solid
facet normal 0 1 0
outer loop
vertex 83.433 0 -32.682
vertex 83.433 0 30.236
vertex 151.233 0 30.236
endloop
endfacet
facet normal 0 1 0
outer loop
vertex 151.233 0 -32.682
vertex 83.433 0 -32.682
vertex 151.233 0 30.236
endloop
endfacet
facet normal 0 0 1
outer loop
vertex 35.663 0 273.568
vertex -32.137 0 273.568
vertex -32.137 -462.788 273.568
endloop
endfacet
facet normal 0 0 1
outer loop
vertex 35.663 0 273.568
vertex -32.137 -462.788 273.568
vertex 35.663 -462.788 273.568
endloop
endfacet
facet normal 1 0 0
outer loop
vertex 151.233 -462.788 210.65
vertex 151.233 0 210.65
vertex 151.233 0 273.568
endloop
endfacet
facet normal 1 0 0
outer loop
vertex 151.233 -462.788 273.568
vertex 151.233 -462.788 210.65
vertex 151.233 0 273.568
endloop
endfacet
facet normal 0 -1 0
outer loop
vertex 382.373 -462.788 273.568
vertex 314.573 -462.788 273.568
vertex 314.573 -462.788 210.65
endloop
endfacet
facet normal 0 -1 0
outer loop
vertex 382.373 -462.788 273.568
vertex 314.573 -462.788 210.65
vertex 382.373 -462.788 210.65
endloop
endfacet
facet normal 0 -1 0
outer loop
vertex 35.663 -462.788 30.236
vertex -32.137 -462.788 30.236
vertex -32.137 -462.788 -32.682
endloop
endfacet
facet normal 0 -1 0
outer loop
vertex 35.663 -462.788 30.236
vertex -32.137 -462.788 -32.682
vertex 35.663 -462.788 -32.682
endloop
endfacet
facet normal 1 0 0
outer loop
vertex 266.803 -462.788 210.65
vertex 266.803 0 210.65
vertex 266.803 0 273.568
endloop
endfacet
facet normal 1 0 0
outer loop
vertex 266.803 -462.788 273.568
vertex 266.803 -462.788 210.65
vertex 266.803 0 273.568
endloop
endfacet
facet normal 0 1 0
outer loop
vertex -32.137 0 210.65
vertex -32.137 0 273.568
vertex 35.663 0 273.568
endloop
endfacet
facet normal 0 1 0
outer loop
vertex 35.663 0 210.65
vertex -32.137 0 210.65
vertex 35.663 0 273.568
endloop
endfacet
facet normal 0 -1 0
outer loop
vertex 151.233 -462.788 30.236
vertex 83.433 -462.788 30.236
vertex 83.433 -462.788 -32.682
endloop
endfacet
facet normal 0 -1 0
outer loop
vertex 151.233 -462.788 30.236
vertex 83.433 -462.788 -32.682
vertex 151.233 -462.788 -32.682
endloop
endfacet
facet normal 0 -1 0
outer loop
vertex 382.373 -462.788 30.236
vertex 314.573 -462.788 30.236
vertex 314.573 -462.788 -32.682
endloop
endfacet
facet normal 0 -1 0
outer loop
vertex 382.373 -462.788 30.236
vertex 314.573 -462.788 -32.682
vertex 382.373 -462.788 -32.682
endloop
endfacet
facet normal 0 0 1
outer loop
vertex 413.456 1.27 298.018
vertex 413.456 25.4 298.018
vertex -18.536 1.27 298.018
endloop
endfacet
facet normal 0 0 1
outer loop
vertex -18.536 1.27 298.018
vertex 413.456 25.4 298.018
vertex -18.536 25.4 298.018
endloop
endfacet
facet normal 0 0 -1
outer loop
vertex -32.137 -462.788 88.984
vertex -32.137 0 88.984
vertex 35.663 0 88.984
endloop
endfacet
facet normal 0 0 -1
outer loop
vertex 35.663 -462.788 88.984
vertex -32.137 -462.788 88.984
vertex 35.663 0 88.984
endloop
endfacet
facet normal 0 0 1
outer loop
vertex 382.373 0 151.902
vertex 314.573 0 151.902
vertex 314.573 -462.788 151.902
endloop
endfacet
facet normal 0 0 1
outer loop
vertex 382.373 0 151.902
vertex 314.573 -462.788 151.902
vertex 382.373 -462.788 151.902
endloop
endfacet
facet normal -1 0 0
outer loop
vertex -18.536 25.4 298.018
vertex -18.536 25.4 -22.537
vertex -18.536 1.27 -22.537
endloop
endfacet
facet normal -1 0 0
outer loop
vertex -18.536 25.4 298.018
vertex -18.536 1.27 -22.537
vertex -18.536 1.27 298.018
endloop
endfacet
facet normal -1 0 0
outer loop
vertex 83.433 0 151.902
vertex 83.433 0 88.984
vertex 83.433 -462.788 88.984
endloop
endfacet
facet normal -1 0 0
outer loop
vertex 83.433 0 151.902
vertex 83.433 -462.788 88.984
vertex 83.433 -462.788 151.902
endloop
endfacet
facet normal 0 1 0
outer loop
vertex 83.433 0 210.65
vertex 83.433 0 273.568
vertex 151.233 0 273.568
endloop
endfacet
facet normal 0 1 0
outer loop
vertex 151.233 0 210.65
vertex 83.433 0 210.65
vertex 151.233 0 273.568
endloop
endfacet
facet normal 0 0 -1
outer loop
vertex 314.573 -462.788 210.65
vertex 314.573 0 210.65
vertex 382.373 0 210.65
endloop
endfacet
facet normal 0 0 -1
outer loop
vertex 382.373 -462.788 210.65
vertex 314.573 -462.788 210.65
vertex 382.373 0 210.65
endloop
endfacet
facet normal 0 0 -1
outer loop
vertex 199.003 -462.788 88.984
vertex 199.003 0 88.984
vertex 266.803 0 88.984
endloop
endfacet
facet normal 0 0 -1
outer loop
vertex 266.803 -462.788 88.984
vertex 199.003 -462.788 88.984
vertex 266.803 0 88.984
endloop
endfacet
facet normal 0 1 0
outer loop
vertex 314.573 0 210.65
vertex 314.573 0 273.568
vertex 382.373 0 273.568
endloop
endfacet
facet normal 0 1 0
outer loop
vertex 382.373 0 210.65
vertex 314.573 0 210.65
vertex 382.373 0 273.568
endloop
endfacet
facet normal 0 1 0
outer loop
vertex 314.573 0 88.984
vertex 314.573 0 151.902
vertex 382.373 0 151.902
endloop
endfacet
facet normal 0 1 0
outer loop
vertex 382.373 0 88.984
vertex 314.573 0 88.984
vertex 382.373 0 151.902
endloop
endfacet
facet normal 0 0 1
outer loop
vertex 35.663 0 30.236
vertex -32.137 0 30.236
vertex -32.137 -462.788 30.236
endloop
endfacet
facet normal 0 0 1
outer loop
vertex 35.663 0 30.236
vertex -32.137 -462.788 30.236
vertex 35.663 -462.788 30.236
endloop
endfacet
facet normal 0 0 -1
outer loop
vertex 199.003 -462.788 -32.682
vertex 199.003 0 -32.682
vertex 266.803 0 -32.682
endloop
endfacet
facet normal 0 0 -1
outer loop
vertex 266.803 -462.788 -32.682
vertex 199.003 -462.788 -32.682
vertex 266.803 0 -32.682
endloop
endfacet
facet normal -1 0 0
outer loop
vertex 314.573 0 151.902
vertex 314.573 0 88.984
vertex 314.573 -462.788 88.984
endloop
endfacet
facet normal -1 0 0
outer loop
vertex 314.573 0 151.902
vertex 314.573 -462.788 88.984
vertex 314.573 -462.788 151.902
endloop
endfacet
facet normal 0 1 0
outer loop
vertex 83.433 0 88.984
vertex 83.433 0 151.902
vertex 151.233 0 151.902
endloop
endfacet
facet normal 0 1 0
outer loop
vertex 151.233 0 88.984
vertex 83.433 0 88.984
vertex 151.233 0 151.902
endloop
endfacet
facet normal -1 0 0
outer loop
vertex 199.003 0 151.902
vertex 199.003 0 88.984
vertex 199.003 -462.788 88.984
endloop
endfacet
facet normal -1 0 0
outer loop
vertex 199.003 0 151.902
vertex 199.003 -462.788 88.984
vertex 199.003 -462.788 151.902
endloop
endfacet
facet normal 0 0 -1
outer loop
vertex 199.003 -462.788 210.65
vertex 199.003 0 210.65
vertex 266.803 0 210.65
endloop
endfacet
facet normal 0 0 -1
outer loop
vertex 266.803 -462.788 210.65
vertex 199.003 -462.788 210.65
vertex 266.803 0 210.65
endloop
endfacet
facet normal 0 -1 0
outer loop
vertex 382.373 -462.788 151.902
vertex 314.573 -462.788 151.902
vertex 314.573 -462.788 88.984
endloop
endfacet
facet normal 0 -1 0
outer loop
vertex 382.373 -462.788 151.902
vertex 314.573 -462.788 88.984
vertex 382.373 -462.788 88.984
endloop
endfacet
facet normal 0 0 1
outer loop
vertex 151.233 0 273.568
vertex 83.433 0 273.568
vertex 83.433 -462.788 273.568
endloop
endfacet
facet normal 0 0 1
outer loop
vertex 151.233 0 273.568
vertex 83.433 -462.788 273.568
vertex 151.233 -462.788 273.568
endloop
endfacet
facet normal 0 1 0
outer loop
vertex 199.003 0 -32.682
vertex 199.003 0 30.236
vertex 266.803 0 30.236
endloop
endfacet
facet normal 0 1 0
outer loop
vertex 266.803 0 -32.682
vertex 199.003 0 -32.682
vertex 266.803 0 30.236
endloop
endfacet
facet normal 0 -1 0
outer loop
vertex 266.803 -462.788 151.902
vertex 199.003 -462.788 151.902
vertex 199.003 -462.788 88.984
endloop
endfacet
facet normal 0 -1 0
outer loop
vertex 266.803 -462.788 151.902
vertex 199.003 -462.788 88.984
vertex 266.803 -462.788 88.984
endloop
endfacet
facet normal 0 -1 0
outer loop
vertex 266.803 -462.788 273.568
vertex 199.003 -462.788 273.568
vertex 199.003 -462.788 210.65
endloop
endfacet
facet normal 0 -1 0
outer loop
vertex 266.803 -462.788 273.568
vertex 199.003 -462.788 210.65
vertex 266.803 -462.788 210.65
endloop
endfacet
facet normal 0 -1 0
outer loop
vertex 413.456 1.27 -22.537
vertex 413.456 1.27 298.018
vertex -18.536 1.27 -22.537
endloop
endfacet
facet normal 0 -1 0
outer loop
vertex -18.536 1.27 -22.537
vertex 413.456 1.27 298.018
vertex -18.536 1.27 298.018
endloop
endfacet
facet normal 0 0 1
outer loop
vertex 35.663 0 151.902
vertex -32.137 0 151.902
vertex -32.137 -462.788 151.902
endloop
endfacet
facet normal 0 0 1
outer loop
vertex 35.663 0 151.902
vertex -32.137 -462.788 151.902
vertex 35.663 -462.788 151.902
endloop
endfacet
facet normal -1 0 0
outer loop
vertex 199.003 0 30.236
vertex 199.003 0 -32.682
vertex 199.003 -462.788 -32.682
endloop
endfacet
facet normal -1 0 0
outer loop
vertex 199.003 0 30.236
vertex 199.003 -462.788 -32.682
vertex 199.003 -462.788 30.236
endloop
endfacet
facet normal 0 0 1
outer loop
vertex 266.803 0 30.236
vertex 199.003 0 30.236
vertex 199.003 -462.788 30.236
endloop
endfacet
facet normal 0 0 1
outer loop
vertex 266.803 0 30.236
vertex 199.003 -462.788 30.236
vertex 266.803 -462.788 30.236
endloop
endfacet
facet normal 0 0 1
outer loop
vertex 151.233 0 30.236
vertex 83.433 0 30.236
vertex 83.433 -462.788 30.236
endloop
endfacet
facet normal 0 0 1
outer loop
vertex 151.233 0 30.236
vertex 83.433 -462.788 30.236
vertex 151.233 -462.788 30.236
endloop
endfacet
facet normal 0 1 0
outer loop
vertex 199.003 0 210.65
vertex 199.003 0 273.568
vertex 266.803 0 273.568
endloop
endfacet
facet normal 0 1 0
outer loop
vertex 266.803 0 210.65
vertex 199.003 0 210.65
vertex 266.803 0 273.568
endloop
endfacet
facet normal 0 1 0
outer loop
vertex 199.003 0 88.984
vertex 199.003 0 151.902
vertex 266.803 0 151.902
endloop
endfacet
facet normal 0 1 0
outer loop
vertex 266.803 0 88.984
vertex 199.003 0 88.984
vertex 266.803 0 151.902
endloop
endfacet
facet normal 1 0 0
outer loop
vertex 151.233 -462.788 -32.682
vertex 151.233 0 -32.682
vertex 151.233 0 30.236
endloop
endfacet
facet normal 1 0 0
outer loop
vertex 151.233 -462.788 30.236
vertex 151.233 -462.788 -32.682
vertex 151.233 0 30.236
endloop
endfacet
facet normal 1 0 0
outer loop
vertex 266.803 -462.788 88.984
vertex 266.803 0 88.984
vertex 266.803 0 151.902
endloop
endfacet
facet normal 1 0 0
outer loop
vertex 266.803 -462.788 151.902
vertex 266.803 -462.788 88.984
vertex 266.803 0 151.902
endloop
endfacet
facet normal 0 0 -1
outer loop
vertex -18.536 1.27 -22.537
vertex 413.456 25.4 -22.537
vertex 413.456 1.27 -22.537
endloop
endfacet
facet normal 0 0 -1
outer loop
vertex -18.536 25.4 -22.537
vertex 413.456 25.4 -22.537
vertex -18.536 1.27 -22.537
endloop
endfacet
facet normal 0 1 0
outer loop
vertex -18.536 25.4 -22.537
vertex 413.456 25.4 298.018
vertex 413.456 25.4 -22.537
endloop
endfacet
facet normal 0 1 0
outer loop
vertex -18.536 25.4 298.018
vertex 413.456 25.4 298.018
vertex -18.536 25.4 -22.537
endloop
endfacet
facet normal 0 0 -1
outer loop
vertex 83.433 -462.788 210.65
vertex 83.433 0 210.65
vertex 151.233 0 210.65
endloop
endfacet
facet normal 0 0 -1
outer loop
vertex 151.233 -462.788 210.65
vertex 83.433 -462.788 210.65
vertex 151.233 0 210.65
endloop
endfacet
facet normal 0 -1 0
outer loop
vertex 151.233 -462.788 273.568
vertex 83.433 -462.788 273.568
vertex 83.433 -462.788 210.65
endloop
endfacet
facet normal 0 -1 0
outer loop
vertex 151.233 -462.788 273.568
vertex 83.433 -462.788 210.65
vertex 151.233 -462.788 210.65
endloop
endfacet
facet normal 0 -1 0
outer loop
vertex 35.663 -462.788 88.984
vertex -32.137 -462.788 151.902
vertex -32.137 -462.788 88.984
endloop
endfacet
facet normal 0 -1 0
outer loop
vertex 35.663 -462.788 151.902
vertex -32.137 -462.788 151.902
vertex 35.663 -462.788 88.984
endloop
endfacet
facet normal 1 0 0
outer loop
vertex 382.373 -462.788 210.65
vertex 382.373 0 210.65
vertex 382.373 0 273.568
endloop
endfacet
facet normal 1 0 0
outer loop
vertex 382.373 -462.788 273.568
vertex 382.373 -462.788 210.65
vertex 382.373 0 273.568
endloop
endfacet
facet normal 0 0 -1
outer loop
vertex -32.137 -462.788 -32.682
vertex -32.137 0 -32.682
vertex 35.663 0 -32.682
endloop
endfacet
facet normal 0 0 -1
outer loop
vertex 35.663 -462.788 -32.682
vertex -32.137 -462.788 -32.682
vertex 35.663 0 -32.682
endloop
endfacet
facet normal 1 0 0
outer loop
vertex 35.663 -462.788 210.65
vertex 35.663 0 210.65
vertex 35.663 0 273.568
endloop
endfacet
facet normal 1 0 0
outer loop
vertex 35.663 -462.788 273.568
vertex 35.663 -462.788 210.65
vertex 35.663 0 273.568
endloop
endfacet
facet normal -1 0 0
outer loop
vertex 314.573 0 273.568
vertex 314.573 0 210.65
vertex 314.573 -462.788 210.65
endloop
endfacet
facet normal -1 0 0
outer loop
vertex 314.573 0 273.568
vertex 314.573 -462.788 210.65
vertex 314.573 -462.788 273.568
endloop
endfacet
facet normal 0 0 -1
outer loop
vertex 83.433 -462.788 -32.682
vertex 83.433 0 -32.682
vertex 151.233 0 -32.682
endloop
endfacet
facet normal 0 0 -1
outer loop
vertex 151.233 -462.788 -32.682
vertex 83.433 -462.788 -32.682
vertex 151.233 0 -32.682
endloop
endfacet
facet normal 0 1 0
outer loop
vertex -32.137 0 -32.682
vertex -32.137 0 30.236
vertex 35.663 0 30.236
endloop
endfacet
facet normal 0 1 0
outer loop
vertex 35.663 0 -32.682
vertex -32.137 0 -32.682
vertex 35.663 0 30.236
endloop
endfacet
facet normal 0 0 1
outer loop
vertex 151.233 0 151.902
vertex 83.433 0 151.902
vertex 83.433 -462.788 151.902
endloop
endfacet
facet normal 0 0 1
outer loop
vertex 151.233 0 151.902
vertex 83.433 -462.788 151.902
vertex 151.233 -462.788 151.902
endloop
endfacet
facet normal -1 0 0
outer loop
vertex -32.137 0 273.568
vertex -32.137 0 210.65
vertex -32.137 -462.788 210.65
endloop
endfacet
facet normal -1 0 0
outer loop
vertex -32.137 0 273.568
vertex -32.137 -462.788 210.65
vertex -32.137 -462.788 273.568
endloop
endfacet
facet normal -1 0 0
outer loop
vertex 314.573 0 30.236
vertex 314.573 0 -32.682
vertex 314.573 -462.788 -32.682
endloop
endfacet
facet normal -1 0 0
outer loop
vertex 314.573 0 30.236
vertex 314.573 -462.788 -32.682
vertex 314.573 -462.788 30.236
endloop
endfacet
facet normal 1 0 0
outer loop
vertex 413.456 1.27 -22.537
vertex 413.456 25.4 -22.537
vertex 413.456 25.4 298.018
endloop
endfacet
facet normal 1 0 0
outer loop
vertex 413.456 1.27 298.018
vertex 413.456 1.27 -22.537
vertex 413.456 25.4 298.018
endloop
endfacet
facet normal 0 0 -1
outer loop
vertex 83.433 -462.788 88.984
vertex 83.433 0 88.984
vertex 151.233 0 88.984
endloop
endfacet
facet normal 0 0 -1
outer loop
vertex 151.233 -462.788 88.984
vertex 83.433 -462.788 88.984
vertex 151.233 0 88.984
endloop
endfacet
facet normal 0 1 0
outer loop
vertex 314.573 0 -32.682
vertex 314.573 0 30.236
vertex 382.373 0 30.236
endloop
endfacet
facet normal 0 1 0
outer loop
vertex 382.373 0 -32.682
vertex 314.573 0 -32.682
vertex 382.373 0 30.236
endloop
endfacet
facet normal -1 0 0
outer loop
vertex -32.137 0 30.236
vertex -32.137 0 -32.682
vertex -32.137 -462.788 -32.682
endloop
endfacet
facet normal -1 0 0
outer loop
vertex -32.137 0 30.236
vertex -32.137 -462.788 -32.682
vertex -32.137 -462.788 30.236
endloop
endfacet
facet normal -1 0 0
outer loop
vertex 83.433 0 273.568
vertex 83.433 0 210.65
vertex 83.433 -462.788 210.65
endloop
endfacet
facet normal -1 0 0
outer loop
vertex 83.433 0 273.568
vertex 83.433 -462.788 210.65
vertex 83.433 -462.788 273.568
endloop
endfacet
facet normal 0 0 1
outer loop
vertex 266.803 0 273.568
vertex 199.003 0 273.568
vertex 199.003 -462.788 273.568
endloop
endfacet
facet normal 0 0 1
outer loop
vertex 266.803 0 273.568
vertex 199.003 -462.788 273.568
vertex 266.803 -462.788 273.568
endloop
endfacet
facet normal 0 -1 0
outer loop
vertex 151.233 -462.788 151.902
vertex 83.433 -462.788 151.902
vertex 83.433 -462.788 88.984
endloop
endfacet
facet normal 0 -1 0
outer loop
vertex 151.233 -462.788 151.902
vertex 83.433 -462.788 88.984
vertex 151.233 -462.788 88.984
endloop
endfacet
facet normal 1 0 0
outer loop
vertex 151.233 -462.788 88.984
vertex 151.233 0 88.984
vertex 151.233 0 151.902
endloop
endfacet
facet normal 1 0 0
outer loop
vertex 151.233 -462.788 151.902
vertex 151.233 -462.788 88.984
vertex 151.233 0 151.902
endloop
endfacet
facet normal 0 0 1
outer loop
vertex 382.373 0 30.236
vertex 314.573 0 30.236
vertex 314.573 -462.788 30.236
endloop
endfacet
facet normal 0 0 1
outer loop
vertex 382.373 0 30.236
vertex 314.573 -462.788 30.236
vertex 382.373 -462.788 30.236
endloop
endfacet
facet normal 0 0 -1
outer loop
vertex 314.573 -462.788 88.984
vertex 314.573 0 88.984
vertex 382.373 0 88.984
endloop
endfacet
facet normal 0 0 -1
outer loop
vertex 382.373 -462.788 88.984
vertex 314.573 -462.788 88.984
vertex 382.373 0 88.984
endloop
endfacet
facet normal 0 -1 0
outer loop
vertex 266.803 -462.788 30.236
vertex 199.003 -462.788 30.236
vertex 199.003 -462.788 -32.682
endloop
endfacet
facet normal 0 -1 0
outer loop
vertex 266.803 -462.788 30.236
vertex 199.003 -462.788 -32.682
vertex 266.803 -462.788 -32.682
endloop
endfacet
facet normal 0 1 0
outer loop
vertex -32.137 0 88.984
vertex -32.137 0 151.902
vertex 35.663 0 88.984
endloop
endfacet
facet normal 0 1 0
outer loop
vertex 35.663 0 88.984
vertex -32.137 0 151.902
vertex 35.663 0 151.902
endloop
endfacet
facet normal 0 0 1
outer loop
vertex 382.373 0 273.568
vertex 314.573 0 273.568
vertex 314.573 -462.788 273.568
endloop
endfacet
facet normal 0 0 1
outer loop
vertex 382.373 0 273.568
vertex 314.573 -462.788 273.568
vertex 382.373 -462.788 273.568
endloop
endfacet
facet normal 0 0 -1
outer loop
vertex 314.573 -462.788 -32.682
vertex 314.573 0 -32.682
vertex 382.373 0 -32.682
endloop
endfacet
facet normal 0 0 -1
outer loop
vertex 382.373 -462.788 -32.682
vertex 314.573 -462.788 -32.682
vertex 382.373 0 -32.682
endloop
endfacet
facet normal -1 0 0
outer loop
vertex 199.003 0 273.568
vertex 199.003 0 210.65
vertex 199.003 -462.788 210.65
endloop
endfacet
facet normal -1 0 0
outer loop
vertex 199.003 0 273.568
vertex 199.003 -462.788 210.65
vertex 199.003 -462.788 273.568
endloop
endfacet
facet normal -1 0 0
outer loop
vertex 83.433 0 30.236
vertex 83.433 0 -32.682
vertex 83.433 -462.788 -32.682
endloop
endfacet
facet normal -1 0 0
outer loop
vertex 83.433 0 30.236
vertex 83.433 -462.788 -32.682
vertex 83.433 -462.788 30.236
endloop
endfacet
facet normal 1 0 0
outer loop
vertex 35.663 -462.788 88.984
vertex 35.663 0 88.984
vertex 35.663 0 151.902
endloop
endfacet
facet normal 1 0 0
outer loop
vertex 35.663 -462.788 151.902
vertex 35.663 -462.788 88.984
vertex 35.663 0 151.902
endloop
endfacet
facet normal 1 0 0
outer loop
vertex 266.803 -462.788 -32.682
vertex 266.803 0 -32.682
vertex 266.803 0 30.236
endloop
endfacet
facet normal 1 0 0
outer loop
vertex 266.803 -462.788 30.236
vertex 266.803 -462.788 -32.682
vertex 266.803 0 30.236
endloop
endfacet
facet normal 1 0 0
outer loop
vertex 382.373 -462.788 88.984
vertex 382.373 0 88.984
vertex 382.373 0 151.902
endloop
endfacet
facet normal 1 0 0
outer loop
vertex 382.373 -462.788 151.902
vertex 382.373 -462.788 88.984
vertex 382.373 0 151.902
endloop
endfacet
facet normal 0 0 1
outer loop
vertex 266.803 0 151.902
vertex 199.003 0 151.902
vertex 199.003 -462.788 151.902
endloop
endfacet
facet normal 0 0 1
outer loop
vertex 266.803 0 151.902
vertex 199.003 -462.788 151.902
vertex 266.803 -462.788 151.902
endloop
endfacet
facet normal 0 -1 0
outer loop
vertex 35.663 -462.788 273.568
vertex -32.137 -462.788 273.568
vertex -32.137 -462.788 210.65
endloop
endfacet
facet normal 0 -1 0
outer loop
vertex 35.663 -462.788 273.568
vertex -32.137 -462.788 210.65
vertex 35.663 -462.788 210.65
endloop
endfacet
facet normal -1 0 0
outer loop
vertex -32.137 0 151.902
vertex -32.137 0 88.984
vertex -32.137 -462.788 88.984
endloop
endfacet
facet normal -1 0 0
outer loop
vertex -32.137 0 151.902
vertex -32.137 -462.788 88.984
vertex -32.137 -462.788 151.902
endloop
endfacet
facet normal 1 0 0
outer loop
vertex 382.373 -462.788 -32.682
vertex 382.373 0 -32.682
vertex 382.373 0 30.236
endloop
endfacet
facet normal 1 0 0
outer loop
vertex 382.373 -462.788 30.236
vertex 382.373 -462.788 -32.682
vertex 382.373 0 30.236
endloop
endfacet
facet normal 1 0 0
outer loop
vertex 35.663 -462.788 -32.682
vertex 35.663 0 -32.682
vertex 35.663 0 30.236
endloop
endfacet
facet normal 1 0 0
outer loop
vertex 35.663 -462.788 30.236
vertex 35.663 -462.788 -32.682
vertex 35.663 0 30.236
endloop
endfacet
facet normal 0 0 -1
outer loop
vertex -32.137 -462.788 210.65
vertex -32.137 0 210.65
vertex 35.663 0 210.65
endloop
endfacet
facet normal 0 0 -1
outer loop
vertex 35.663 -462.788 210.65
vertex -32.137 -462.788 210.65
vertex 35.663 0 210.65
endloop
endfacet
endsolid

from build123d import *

# Parameters (mm, degrees)
F0_W     = 67.8000804037
F0_H     = 62.9184693098
F1_DEPTH = 462.788
F3_W     = 431.9924879819
F3_H     = 320.5544073135
F4_DEPTH = 24.13


with BuildPart() as f1:
    # F0 (on Front) → F1 (new body)
    with BuildSketch(Plane.XZ):
        with Locations((1.76280085, -1.2232288718)):
            Rectangle(F0_W, F0_H)
    extrude(amount=F1_DEPTH)


with BuildPart() as f1b:
    # F0 (on Front) → F1, piece 2 (new body)
    with BuildSketch(Plane.XZ):
        with Locations((1.76280085, 120.4427711282)):
            Rectangle(F0_W, F0_H)
    extrude(amount=F1_DEPTH)


with BuildPart() as f1c:
    # F0 (on Front) → F1, piece 3 (new body)
    with BuildSketch(Plane.XZ):
        with Locations((1.76280085, 242.1087711282)):
            Rectangle(F0_W, F0_H)
    extrude(amount=F1_DEPTH)


with BuildPart() as f1d:
    # F0 (on Front) → F1, piece 4 (new body)
    with BuildSketch(Plane.XZ):
        with Locations((117.33280085, -1.2232288718)):
            Rectangle(F0_W, F0_H)
    extrude(amount=F1_DEPTH)


with BuildPart() as f1e:
    # F0 (on Front) → F1, piece 5 (new body)
    with BuildSketch(Plane.XZ):
        with Locations((117.33280085, 120.4427711282)):
            Rectangle(F0_W, F0_H)
    extrude(amount=F1_DEPTH)


with BuildPart() as f1f:
    # F0 (on Front) → F1, piece 6 (new body)
    with BuildSketch(Plane.XZ):
        with Locations((117.33280085, 242.1087711282)):
            Rectangle(F0_W, F0_H)
    extrude(amount=F1_DEPTH)


with BuildPart() as f1g:
    # F0 (on Front) → F1, piece 7 (new body)
    with BuildSketch(Plane.XZ):
        with Locations((232.90280085, -1.2232288718)):
            Rectangle(F0_W, F0_H)
    extrude(amount=F1_DEPTH)


with BuildPart() as f1h:
    # F0 (on Front) → F1, piece 8 (new body)
    with BuildSketch(Plane.XZ):
        with Locations((232.90280085, 120.4427711282)):
            Rectangle(F0_W, F0_H)
    extrude(amount=F1_DEPTH)


with BuildPart() as f1i:
    # F0 (on Front) → F1, piece 9 (new body)
    with BuildSketch(Plane.XZ):
        with Locations((232.90280085, 242.1087711282)):
            Rectangle(F0_W, F0_H)
    extrude(amount=F1_DEPTH)


with BuildPart() as f1j:
    # F0 (on Front) → F1, piece 10 (new body)
    with BuildSketch(Plane.XZ):
        with Locations((348.47280085, -1.2232288718)):
            Rectangle(F0_W, F0_H)
    extrude(amount=F1_DEPTH)


with BuildPart() as f1k:
    # F0 (on Front) → F1, piece 11 (new body)
    with BuildSketch(Plane.XZ):
        with Locations((348.47280085, 120.4427711282)):
            Rectangle(F0_W, F0_H)
    extrude(amount=F1_DEPTH)


with BuildPart() as f1l:
    # F0 (on Front) → F1, piece 12 (new body)
    with BuildSketch(Plane.XZ):
        with Locations((348.47280085, 242.1087711282)):
            Rectangle(F0_W, F0_H)
    extrude(amount=F1_DEPTH)


with BuildPart() as f4:
    # F3 (on offset) → F4 (new body)
    with BuildSketch(Plane(origin=(0, 25.4, 0), x_dir=(-1, 0, 0), z_dir=(0, 1, 0))):
        with Locations((-197.4599873647, 137.7403279766)):
            Rectangle(F3_W, F3_H)
    extrude(amount=-F4_DEPTH)


solid = Compound([f1.part, f1b.part, f1c.part, f1d.part, f1e.part, f1f.part, f1g.part, f1h.part, f1i.part, f1j.part, f1k.part, f1l.part, f4.part])
